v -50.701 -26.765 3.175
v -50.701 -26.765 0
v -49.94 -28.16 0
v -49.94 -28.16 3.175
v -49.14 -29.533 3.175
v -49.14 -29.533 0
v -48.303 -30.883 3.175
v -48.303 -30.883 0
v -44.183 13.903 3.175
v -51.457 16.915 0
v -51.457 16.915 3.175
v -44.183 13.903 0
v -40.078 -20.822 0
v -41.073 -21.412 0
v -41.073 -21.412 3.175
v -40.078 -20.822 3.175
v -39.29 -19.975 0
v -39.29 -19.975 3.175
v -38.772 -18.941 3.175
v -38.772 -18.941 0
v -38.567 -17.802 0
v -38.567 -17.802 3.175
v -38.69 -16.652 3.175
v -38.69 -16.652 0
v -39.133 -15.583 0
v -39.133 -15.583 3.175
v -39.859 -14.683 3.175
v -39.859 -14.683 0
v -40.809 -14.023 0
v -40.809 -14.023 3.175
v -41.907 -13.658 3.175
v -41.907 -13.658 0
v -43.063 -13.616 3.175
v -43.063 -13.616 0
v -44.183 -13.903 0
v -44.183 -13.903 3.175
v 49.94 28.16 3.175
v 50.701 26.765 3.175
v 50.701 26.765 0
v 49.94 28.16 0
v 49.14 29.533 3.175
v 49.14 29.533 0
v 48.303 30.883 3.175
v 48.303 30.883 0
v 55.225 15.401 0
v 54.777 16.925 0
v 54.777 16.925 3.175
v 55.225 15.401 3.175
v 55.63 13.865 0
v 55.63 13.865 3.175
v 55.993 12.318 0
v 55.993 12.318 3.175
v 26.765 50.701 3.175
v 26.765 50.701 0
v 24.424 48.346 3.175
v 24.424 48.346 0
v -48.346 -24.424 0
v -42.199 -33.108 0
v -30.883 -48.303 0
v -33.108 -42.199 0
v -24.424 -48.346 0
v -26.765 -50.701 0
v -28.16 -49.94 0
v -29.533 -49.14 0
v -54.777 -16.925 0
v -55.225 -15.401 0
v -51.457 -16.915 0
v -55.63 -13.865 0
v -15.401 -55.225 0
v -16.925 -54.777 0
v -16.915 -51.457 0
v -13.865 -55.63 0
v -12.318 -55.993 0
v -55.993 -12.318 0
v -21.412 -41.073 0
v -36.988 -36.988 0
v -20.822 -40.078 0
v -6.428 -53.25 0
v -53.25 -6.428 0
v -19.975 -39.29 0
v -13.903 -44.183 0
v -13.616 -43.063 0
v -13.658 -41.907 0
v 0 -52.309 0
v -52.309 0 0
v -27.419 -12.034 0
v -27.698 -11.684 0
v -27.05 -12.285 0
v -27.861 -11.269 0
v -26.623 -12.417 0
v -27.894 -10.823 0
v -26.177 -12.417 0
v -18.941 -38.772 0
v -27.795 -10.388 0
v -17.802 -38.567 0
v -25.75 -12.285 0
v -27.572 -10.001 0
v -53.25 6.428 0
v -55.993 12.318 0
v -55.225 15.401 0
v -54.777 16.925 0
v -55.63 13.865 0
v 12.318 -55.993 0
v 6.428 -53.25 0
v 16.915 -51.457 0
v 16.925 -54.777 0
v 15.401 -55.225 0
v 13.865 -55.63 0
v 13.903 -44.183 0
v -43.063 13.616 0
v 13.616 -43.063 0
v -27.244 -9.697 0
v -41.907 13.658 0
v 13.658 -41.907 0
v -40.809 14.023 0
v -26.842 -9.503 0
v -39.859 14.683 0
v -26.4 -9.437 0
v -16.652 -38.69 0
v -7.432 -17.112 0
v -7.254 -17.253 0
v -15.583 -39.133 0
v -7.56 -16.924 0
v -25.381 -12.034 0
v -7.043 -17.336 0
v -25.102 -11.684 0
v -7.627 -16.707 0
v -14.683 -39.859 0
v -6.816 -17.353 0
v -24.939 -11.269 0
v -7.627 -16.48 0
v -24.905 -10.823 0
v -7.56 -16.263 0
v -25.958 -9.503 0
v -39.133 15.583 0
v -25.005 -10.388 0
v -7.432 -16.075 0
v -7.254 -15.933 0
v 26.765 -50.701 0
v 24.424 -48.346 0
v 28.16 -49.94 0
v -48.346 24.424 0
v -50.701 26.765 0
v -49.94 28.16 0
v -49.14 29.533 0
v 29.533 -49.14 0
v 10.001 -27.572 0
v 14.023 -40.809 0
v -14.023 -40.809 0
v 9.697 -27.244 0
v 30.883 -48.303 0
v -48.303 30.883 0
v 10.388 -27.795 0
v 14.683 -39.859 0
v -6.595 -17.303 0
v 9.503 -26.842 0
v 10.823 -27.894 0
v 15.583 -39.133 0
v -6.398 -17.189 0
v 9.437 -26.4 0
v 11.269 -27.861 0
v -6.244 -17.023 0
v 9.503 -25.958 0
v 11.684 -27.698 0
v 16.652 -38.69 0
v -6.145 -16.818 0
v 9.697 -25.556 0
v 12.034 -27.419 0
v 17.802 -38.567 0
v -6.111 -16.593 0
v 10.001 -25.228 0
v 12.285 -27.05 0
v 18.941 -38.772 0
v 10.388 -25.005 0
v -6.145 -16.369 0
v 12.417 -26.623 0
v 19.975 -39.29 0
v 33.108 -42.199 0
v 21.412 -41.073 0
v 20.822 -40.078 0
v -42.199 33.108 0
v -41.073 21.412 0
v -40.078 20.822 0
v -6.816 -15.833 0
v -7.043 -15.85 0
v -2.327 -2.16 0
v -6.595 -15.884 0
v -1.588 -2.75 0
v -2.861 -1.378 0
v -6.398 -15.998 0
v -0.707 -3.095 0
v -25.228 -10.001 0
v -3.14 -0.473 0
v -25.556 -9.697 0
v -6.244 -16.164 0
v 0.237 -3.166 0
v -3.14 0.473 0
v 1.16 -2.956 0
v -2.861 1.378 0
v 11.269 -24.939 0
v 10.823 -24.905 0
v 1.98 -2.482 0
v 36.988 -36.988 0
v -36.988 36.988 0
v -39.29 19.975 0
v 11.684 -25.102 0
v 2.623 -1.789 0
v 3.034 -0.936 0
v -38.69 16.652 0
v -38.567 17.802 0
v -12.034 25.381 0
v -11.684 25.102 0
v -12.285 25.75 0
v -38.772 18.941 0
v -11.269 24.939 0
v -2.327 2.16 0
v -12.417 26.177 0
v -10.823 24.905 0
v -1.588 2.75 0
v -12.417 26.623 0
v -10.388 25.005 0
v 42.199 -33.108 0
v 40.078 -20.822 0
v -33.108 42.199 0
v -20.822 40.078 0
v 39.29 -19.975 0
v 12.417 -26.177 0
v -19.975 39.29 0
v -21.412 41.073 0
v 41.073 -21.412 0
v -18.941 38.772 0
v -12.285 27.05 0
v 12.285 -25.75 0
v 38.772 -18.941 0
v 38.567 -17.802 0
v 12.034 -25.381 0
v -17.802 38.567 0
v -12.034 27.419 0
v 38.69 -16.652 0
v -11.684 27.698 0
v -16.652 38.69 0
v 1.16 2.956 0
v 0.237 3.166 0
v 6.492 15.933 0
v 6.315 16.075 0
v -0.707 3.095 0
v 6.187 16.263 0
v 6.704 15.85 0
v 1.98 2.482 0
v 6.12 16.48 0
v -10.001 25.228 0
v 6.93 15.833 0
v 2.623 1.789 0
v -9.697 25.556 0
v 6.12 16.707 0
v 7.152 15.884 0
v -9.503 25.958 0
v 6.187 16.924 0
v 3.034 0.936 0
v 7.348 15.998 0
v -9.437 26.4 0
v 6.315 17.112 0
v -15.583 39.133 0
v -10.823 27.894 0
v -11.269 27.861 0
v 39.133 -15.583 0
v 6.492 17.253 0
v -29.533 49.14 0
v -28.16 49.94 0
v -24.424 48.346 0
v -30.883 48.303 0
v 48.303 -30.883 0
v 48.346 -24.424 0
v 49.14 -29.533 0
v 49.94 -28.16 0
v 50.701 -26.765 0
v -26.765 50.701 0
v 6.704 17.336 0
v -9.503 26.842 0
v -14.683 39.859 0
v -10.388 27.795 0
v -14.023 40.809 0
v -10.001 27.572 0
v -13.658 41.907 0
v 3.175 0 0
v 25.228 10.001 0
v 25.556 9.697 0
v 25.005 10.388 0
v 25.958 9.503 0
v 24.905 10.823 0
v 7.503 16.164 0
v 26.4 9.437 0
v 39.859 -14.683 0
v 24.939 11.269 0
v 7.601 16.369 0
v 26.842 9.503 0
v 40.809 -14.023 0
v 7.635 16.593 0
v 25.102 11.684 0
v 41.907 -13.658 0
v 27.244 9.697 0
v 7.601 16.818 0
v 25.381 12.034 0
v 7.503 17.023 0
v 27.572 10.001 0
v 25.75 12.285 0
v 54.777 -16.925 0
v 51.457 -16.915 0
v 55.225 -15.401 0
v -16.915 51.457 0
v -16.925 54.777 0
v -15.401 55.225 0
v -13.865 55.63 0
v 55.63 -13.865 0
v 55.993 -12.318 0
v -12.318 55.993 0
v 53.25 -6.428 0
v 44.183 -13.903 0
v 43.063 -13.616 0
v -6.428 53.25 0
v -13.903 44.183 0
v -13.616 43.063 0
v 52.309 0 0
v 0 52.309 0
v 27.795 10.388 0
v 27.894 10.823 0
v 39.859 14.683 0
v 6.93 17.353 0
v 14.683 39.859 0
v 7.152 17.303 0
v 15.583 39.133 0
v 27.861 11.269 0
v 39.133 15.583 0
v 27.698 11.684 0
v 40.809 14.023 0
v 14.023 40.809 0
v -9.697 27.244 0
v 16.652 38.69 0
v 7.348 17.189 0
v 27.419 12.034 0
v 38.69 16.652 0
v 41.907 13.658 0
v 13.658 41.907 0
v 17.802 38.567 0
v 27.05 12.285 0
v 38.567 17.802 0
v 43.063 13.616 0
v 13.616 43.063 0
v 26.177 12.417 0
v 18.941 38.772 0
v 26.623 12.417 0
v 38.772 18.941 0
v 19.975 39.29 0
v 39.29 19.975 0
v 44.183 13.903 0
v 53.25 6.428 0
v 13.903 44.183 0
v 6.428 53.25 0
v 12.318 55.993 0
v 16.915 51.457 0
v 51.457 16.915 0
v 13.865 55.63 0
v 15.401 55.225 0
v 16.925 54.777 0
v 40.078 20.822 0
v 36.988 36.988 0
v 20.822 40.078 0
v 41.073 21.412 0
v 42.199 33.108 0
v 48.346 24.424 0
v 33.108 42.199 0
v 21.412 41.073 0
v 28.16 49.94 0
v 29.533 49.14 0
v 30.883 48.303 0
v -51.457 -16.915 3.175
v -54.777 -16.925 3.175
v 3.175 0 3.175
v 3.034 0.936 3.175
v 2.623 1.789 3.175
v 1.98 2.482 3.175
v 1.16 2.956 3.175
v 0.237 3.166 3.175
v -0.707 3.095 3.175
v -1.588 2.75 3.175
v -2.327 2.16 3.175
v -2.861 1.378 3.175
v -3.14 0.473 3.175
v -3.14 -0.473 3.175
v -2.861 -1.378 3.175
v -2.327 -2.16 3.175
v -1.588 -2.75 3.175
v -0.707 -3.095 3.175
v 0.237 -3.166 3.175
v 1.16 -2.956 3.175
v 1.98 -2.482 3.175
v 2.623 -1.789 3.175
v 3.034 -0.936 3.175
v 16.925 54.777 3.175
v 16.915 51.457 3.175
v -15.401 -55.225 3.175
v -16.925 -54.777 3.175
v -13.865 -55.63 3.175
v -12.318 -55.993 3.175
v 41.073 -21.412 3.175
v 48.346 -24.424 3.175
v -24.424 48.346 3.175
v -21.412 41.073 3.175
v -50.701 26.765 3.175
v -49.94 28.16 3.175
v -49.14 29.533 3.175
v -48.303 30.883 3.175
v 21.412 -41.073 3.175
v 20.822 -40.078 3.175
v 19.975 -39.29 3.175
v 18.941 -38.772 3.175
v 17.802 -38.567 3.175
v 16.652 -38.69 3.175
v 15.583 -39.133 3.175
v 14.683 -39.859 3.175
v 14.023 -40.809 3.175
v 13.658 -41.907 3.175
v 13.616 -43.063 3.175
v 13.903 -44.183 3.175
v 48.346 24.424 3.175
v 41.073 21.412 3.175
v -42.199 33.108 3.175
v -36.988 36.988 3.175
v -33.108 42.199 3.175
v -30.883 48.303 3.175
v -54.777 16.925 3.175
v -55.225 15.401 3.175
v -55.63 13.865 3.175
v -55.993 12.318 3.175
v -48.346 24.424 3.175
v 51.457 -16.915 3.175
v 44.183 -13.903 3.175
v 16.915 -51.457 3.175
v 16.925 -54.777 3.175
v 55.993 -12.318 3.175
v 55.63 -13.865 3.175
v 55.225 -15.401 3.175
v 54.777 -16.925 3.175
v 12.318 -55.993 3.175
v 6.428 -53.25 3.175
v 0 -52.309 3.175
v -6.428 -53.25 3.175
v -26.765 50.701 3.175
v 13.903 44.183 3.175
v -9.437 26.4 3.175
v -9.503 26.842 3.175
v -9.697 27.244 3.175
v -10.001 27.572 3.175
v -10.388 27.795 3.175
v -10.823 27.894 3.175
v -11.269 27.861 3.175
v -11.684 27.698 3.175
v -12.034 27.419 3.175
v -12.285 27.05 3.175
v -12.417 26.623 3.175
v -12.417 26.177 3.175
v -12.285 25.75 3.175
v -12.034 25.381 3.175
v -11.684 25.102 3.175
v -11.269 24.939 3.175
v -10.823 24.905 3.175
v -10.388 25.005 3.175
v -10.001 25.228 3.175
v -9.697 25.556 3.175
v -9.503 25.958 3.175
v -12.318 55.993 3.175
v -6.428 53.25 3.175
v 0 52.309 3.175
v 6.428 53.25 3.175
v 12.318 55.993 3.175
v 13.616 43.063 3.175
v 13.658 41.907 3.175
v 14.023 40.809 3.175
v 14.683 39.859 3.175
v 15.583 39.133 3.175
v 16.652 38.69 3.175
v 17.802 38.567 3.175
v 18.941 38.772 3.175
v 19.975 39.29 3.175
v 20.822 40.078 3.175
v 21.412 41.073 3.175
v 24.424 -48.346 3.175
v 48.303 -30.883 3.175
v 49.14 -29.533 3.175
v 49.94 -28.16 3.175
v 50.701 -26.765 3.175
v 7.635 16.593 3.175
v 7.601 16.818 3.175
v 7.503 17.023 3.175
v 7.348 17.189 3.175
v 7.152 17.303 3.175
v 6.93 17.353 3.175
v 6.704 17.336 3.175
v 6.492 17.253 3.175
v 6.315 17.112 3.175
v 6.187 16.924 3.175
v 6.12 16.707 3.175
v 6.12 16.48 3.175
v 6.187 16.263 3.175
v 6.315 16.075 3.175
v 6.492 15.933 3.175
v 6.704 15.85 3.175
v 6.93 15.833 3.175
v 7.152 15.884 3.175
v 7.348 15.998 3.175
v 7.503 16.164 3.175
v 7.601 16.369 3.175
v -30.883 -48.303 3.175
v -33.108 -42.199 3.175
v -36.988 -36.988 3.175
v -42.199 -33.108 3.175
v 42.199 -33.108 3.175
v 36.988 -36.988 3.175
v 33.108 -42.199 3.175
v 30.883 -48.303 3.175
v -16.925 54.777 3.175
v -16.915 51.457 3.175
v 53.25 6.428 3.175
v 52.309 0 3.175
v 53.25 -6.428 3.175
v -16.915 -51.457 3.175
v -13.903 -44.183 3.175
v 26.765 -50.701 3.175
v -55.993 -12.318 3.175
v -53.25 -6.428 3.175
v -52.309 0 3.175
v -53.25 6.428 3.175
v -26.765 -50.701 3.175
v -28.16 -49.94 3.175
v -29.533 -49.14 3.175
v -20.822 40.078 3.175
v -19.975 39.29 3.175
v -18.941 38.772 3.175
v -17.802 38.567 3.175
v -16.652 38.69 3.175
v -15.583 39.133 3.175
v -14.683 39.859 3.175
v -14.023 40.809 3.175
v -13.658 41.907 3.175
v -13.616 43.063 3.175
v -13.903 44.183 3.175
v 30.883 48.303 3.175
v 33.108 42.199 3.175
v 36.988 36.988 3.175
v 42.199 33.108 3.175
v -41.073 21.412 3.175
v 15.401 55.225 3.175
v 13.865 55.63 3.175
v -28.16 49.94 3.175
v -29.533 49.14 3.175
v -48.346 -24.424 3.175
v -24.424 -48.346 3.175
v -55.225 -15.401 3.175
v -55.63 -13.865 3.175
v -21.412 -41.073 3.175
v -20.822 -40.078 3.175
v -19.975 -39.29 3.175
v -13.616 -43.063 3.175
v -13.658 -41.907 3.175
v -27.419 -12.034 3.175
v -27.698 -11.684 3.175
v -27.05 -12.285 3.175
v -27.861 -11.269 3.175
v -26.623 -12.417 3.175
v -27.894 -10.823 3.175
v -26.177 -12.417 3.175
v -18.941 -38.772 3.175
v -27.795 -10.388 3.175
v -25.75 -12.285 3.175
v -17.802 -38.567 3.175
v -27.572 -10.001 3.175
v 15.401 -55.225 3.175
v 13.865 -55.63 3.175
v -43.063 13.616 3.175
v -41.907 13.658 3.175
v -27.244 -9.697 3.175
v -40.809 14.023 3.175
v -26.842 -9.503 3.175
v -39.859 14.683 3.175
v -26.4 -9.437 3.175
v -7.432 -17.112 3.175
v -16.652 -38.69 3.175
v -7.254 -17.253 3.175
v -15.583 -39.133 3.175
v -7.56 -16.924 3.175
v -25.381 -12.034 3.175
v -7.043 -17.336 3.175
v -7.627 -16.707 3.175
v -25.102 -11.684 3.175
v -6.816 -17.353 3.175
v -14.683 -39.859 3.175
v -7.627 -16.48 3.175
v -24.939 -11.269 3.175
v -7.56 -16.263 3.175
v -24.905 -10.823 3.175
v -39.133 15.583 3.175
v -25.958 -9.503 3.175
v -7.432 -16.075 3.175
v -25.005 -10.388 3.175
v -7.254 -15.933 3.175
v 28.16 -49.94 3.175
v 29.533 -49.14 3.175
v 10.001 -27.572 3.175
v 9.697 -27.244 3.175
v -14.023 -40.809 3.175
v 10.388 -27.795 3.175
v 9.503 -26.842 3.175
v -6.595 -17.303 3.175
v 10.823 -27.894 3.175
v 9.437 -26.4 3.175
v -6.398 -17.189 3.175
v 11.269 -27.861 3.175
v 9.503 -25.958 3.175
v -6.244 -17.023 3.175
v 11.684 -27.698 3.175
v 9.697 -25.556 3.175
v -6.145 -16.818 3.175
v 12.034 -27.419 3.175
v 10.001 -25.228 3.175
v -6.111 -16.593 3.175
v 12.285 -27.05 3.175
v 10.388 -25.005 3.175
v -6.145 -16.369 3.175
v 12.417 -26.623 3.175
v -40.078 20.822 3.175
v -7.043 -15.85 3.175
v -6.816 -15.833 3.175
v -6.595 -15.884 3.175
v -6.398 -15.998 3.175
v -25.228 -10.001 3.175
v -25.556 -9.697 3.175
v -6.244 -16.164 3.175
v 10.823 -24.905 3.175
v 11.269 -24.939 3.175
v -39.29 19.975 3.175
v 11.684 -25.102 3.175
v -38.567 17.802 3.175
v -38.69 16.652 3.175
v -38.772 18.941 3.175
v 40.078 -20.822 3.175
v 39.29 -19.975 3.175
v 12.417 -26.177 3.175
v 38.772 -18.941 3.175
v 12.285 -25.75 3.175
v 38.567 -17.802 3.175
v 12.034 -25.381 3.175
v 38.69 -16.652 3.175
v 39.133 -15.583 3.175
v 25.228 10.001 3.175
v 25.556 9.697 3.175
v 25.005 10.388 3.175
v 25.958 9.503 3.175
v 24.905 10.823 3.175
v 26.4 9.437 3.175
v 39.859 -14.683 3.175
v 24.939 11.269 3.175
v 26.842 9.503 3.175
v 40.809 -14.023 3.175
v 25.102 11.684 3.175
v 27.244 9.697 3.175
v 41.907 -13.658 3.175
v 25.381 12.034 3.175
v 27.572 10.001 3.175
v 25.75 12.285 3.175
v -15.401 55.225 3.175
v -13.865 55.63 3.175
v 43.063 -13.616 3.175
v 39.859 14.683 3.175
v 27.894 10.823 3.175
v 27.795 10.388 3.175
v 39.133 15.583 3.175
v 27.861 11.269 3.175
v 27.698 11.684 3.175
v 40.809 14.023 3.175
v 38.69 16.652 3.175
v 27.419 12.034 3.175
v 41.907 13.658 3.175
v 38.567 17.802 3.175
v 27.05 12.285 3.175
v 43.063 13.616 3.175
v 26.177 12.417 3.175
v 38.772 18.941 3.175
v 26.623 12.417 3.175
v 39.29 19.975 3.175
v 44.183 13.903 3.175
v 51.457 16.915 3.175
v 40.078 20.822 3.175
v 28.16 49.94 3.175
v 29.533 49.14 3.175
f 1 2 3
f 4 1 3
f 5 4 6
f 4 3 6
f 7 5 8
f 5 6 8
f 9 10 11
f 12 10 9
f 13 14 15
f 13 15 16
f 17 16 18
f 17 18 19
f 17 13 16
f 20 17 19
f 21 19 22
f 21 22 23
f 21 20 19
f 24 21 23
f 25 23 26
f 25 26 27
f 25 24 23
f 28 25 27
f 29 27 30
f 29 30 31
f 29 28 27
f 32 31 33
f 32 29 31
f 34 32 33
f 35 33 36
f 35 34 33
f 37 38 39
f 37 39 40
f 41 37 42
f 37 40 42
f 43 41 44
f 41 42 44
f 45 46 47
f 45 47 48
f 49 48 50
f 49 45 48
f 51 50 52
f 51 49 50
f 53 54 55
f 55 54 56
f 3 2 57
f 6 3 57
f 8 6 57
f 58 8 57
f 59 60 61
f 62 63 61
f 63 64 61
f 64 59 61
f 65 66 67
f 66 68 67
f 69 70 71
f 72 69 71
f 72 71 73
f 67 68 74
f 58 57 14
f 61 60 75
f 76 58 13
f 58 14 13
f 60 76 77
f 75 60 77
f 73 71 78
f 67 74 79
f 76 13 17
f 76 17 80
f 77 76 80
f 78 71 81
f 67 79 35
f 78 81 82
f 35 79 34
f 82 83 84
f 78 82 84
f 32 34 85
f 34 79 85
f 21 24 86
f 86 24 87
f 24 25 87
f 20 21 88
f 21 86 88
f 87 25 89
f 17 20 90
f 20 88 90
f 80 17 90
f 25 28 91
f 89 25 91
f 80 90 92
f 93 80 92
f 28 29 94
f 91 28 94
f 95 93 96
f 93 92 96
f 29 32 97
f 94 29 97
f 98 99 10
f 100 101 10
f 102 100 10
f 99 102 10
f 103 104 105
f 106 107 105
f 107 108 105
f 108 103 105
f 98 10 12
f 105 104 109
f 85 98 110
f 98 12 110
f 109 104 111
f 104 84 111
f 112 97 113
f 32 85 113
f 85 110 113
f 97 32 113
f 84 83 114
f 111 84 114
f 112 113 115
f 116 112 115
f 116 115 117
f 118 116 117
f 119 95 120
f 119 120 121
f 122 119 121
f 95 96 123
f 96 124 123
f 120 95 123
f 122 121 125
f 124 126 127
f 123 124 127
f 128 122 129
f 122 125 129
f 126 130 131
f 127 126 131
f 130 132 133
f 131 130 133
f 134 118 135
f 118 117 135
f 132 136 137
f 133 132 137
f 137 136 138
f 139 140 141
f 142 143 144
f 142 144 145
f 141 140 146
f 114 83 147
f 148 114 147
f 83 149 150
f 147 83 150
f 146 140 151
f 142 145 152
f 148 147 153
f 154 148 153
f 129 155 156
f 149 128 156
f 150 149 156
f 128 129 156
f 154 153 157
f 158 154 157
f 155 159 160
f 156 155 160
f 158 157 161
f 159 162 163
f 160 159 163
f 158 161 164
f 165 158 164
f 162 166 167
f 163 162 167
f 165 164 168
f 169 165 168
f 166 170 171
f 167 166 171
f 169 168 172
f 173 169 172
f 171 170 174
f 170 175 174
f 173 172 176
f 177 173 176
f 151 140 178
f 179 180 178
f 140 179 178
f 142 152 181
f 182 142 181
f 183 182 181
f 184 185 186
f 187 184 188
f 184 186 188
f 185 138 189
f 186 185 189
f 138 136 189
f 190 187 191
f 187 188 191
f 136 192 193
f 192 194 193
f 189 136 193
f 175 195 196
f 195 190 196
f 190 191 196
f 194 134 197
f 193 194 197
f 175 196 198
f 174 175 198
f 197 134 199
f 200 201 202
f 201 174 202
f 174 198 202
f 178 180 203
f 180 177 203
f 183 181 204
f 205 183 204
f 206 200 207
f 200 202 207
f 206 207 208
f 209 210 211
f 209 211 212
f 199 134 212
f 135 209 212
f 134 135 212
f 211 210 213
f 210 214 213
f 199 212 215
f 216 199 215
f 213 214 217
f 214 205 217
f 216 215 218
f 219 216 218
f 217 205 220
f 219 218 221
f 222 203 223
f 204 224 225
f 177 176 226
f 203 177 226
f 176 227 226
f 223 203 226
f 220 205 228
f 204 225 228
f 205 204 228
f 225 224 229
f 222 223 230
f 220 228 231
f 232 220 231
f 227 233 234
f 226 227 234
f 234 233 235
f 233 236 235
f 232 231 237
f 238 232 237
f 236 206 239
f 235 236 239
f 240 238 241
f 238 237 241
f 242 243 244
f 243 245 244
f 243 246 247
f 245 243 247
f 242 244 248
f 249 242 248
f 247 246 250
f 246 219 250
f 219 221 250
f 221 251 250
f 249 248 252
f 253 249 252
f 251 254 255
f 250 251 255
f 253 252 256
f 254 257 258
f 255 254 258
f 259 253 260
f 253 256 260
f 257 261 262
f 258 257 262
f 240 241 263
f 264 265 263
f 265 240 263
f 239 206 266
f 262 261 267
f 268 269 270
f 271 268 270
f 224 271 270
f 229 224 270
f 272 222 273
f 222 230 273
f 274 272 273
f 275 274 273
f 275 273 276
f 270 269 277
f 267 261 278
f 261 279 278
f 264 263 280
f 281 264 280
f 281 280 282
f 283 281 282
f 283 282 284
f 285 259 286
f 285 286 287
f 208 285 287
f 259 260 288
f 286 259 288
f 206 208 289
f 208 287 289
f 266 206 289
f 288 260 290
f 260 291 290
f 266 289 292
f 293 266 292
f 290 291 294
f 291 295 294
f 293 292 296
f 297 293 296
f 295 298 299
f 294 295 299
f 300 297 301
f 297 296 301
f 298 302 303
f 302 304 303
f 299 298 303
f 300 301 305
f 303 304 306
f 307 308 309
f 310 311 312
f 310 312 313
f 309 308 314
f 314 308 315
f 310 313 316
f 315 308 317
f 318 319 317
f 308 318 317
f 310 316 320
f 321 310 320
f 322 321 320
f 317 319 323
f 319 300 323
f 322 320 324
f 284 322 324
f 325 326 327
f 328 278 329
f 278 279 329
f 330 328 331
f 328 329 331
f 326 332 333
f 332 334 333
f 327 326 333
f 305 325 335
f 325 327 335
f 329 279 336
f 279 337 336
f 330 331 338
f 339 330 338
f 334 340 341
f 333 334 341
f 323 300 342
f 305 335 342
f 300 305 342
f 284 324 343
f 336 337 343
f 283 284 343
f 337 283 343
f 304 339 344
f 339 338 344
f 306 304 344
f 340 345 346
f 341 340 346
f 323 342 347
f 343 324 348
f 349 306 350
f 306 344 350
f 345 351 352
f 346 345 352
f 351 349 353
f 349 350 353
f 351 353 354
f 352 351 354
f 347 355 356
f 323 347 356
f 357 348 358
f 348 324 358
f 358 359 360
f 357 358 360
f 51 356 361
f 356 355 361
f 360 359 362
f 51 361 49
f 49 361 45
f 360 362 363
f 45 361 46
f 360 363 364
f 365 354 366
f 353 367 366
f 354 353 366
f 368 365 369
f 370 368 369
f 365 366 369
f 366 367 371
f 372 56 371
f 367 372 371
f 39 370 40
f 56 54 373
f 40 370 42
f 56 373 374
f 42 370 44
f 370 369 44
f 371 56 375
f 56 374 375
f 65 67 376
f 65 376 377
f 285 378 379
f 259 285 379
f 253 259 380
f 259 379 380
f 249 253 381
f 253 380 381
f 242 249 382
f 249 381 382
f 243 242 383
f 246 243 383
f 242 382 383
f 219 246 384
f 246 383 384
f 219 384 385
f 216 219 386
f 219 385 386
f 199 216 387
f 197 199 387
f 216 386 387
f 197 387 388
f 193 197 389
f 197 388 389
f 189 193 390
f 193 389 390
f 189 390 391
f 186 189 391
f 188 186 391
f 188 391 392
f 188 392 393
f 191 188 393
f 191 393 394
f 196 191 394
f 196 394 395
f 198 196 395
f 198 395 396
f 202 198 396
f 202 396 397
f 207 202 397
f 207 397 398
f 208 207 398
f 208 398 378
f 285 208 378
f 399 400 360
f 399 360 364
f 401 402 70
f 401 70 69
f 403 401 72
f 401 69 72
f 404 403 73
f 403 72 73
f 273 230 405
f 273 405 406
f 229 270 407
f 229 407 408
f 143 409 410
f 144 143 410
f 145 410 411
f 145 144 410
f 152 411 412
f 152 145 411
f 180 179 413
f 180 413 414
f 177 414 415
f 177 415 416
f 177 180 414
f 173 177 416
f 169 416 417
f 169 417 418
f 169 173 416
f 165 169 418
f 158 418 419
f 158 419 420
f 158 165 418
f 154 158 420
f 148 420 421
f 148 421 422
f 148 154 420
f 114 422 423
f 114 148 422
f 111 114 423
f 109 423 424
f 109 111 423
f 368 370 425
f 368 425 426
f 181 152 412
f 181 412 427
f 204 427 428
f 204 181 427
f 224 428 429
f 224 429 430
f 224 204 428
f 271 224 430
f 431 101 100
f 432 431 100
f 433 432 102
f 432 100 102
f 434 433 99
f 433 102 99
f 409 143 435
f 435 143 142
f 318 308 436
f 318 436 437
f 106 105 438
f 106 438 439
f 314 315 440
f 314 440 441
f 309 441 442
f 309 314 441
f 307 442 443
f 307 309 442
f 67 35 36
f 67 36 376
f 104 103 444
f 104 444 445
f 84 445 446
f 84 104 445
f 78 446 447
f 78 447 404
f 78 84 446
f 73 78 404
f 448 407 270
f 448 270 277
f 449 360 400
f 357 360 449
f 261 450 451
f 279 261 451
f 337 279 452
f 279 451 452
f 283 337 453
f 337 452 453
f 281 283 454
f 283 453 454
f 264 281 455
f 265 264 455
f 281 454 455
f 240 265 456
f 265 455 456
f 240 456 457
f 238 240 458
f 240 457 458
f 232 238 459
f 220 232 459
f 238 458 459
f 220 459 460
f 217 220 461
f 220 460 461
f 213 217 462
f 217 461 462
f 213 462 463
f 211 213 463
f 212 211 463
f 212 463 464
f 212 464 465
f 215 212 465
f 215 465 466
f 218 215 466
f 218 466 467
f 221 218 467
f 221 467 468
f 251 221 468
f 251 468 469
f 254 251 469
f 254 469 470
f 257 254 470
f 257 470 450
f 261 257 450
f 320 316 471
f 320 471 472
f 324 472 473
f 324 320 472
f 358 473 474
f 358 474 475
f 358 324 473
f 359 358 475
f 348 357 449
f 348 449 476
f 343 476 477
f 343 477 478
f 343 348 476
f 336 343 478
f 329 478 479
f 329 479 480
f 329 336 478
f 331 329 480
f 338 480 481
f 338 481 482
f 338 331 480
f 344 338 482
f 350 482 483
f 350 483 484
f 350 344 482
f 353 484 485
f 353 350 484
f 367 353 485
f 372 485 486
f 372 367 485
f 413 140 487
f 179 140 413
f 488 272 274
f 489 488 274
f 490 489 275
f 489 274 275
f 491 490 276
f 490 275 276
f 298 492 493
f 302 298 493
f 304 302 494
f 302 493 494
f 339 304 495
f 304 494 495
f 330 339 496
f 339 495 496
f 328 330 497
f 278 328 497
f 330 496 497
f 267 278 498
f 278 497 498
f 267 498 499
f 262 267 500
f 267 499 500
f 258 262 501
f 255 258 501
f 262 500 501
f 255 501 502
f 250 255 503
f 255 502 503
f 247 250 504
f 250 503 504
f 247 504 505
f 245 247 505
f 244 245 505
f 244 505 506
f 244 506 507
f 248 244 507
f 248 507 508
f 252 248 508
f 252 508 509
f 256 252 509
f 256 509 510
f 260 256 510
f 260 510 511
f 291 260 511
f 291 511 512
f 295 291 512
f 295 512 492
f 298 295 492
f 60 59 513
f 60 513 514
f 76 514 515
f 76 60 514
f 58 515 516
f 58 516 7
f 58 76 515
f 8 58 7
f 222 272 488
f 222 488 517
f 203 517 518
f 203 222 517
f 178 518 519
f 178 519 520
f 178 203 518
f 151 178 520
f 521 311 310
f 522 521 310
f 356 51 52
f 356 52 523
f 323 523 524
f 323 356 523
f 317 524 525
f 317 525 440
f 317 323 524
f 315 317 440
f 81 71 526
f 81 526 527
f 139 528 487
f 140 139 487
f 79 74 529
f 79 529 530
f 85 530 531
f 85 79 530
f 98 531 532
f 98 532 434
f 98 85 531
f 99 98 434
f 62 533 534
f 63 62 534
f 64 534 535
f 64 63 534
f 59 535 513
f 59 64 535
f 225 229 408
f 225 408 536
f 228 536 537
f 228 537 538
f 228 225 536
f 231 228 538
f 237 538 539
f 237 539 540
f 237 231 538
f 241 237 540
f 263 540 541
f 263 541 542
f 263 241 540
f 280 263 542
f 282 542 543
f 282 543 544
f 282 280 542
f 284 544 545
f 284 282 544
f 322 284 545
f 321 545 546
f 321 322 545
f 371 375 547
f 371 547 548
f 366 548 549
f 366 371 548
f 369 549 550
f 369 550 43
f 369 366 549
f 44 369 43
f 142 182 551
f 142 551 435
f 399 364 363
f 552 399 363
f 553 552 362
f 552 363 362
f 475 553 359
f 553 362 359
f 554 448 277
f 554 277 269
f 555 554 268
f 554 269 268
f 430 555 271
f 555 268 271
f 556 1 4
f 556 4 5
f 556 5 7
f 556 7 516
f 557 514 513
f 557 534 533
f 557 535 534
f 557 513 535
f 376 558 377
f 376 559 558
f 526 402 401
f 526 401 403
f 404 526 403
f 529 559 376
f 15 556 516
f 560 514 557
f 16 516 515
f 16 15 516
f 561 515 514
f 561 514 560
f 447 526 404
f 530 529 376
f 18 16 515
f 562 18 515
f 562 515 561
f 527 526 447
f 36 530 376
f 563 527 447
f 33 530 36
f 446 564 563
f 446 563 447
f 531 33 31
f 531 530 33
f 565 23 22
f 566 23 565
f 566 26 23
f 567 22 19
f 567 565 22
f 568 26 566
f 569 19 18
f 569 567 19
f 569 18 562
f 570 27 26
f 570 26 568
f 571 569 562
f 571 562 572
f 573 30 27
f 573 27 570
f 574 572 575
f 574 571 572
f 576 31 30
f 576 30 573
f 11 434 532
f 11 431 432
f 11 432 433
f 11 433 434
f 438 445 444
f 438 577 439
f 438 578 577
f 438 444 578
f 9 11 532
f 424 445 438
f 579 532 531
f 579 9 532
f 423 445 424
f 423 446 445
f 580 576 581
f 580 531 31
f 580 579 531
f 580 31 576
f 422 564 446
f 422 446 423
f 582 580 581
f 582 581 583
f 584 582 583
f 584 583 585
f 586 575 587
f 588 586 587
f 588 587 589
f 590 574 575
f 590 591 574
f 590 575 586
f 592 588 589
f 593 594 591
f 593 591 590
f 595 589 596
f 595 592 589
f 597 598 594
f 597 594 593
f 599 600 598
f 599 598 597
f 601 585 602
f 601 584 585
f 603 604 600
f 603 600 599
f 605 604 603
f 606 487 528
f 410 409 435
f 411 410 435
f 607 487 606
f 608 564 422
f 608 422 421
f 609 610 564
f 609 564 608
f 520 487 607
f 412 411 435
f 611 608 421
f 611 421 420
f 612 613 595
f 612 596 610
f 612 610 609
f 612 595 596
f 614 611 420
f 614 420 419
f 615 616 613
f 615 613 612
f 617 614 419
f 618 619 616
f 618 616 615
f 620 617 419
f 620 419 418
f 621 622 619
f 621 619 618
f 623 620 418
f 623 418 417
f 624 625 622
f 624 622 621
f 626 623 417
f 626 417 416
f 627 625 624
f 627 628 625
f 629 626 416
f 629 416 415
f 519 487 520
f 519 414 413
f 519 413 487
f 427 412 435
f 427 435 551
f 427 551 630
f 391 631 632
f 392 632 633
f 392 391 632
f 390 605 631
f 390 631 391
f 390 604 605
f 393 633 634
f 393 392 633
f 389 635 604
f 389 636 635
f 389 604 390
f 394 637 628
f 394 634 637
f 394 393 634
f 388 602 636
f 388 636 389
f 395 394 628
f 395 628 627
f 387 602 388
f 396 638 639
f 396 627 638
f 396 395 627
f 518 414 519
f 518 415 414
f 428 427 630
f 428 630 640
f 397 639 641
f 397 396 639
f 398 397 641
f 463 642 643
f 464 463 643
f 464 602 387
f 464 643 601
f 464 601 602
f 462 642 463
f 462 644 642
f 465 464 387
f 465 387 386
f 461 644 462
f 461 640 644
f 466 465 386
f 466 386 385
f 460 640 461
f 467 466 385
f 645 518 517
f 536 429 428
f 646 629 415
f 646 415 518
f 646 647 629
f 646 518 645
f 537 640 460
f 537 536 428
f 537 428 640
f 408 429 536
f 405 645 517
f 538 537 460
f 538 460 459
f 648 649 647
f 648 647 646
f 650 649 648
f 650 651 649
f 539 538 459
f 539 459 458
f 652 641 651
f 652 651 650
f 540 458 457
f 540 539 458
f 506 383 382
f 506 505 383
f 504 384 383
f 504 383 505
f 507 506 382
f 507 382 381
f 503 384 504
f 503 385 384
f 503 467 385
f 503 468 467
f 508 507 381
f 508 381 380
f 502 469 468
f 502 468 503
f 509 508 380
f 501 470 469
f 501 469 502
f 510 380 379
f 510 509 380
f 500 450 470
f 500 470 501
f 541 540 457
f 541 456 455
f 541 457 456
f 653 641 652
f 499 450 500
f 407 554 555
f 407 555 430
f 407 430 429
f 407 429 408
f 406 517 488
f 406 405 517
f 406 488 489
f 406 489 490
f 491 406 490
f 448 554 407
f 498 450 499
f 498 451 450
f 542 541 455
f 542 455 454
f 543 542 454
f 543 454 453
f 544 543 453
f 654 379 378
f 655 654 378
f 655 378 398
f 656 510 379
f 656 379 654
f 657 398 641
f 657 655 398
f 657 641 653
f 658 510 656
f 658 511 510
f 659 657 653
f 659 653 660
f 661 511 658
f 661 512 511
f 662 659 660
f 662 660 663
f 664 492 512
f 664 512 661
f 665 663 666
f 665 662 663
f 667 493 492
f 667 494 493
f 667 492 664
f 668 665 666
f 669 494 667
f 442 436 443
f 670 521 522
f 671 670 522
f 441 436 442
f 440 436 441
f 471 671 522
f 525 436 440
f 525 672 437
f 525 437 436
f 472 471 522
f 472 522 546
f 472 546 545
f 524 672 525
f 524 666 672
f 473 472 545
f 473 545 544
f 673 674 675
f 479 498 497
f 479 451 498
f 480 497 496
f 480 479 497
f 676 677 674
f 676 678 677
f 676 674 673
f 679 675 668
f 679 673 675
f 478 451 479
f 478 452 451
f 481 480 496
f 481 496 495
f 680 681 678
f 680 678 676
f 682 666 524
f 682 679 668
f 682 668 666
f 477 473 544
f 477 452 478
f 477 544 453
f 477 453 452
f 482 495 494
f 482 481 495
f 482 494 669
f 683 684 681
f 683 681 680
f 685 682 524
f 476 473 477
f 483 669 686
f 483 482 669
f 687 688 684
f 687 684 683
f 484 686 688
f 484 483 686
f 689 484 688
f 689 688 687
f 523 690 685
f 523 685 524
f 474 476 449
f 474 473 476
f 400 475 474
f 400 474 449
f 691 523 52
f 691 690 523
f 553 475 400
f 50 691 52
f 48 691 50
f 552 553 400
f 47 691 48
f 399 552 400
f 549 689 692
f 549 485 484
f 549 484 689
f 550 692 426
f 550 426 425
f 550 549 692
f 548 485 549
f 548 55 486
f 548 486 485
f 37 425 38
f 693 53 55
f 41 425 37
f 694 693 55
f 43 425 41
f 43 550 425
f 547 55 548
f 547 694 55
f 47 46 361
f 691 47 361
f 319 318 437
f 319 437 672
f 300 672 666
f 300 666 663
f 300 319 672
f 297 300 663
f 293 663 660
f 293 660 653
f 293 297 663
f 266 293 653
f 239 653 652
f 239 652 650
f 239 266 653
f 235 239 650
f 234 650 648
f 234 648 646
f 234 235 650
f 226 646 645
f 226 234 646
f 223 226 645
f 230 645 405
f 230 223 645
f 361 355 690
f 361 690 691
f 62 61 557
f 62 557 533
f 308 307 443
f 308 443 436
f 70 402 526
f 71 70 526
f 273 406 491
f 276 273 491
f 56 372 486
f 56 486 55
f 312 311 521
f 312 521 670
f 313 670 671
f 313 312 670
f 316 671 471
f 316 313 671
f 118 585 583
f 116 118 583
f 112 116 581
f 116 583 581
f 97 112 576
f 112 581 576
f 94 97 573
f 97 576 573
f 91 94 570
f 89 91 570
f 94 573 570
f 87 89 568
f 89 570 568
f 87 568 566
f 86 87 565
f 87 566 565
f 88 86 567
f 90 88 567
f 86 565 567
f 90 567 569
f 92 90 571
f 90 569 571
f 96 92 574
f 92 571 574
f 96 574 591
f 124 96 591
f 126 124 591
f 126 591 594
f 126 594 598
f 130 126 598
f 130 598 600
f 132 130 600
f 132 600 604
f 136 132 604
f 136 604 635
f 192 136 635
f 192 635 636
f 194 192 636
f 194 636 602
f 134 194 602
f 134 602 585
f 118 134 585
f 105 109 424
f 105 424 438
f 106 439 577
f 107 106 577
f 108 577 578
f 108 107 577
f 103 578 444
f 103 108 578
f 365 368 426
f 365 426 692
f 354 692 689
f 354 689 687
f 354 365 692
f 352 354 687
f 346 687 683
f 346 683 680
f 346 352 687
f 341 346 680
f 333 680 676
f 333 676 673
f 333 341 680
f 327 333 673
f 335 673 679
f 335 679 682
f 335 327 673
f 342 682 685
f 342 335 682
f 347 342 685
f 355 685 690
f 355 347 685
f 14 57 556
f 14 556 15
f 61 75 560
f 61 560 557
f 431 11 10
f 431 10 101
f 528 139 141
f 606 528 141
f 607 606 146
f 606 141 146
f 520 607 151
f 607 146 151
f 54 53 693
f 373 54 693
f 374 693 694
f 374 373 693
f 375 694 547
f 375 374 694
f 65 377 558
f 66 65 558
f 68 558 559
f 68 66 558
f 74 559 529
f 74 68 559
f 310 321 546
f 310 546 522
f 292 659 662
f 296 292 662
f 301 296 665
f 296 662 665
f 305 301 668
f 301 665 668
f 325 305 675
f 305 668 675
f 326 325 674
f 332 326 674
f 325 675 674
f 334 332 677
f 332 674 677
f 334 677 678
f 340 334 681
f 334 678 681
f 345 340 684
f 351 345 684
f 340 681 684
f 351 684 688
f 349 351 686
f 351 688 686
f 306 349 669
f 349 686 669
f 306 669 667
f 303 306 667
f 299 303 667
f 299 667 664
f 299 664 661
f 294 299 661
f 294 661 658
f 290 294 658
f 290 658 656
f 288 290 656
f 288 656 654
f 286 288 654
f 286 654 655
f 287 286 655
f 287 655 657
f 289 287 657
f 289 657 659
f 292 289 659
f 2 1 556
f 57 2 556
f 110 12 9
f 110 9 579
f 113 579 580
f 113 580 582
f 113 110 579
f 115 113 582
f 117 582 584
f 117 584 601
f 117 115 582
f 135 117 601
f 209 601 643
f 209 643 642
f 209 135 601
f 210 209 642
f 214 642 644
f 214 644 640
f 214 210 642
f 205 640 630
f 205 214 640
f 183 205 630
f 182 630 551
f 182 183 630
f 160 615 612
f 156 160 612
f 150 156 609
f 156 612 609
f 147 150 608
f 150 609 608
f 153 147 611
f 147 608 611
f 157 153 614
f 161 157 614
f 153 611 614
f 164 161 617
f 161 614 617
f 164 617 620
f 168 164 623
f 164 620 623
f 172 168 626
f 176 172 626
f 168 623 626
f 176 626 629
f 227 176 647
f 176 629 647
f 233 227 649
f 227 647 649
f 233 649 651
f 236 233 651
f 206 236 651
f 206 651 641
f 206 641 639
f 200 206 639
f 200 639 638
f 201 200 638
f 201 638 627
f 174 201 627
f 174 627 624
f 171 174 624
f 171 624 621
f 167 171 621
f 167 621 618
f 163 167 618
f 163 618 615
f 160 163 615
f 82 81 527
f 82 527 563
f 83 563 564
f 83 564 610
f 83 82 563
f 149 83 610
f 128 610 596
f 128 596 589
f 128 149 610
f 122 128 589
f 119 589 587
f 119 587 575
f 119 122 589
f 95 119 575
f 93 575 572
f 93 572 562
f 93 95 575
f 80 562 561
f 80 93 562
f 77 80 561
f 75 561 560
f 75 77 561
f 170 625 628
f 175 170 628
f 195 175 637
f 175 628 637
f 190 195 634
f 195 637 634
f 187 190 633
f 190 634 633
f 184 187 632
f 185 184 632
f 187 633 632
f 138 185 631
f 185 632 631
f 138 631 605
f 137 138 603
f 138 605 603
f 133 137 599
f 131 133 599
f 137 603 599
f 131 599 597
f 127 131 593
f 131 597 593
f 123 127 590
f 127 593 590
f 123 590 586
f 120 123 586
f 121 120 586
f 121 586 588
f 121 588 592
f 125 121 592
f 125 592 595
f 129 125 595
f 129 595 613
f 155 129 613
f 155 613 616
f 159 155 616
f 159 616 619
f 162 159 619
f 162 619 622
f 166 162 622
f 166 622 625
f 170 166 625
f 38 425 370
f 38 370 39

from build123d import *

# Parameters (mm, degrees)
SKETCH1_R           = 57.332002373
BOSS_EXTRUDE1_DEPTH = 3.175
CUT_EXTRUDE1_START  = -3.175
CUT_EXTRUDE1_DEPTH  = 3.175
CIRPATTERN1_COUNT   = 8
CUT_EXTRUDE2_REACH  = 81.25
SKETCH3_R           = 3.175
CUT_EXTRUDE3_REACH  = 81.25
SKETCH4_R           = 0.762
CHAMFER1_SIZE       = 3.175
CUT_EXTRUDE4_REACH  = 81.25
SKETCH5_R           = 1.4986
CIRPATTERN2_COUNT   = 4


with BuildPart() as part:
    # Sketch1 → Boss-Extrude1 (new body)
    with BuildSketch(Plane.XY):
        Circle(SKETCH1_R)
    extrude(amount=BOSS_EXTRUDE1_DEPTH)

    # Sketch2 → Cut-Extrude1 (cut)
    with BuildSketch(Plane.XY.offset(3.175).offset(CUT_EXTRUDE1_START)):
        with BuildLine():
            Line((62.131865528, 30.134703259), (41.073015989, 21.411842172))
            ThreePointArc((41.073015989, 21.411842172), (38.873595038, 16.101970283), (44.183466927, 13.902549332))
            Line((44.183466927, 13.902549332), (54.389846688, 18.130170251))
            ThreePointArc((54.389846688, 18.130170251), (55.267949497, 15.245073122), (55.99312865, 12.317793637))
            ThreePointArc((55.99312865, 12.317793637), (52.309071806, 0), (55.99312865, -12.317793637))
            ThreePointArc((55.99312865, -12.317793637), (55.267949497, -15.245073122), (54.389846688, -18.130170251))
            Line((54.389846688, -18.130170251), (44.183466927, -13.902549332))
            ThreePointArc((44.183466927, -13.902549332), (38.873595038, -16.101970283), (41.073015989, -21.411842172))
            Line((41.073015989, -21.411842172), (62.131865528, -30.134703259))
            ThreePointArc((62.131865528, -30.134703259), (69.054102373, 0), (62.131865528, 30.134703259))
        make_face()
    cut_extrude1 = extrude(amount=CUT_EXTRUDE1_DEPTH, mode=Mode.SUBTRACT)

    # CirPattern1: Cut-Extrude1 ×8 about axis
    cirpattern1_axis = Axis((0, 0, 0), (0, 0, 1))
    for i in range(1, CIRPATTERN1_COUNT):
        add(cut_extrude1.rotate(cirpattern1_axis, i * 360 / CIRPATTERN1_COUNT), mode=Mode.SUBTRACT)

    # Sketch3 → Cut-Extrude2 (cut, up to next)
    with BuildSketch(Plane.XY.offset(3.175), mode=Mode.PRIVATE) as cut_extrude2_sk1:
        Circle(SKETCH3_R)
    cut_extrude2_tool1 = extrude(cut_extrude2_sk1.sketch, amount=-CUT_EXTRUDE2_REACH, mode=Mode.PRIVATE) & part.part
    add(cut_extrude2_tool1.solids().sort_by_distance((0, 0, 3.175))[0], mode=Mode.SUBTRACT)

    # Sketch4 → Cut-Extrude3 (cut, up to next)
    with BuildSketch(Plane.XY.offset(3.175), mode=Mode.PRIVATE) as cut_extrude3_sk1:
        with Locations((6.873190472, 16.593349654)):
            Circle(SKETCH4_R)
    cut_extrude3_tool1 = extrude(cut_extrude3_sk1.sketch, amount=-CUT_EXTRUDE3_REACH, mode=Mode.PRIVATE) & part.part
    # Sketch4 → Cut-Extrude3 (cut, up to next)
    with BuildSketch(Plane.XY.offset(3.175), mode=Mode.PRIVATE) as cut_extrude3_sk2:
        with Locations((-6.873190472, -16.593349654)):
            Circle(SKETCH4_R)
    cut_extrude3_tool2 = extrude(cut_extrude3_sk2.sketch, amount=-CUT_EXTRUDE3_REACH, mode=Mode.PRIVATE) & part.part
    add(cut_extrude3_tool1.solids().sort_by_distance((6.87319, 16.59335, 3.175))[0], mode=Mode.SUBTRACT)
    add(cut_extrude3_tool2.solids().sort_by_distance((-6.87319, -16.59335, 3.175))[0], mode=Mode.SUBTRACT)

    # Chamfer1
    # the kernel refuses this chamfer: 3.175, 1.27 mm, written as the material it takes off along each edge
    with BuildSketch(Plane(origin=(-51.279395749, 25.639463092, -8.232085276), x_dir=(0.4570542890286377, 0.8894387988392043, 0), z_dir=(0, 0, 1)), Plane(origin=(-18.130170251, 54.389846688, -8.232085276), x_dir=(0.9521143932521638, 0.3057420189670758, 0), z_dir=(0, 0, 1)), Plane(origin=(25.639463092, 51.279395749, -8.232085276), x_dir=(0.8894387988392037, -0.4570542890286388, 0), z_dir=(0, 0, 1)), Plane(origin=(54.389846688, 18.130170251, -8.232085276), x_dir=(0.30574201896707504, -0.9521143932521642, 0), z_dir=(0, 0, 1)), Plane(origin=(25.639463092, -51.279395749, 11.407085276), x_dir=(0.8894387988391999, 0.45705428902864664, 0), z_dir=(0, 0, -1)), Plane(origin=(-18.130170251, -54.389846688, 11.407085276), x_dir=(0.952114393252168, -0.305742018967063, 0), z_dir=(0, 0, -1)), Plane(origin=(-51.279395749, -25.639463092, 11.407085276), x_dir=(0.4570542890286467, -0.8894387988391996, 0), z_dir=(0, 0, -1))) as chamfer1_piece_1:
        with BuildLine():
            Line((1.265469022, 0), (CHAMFER1_SIZE * 0.0818896104616, -CHAMFER1_SIZE * 0.996641405772))
            Line((CHAMFER1_SIZE * 0.0818896104616, -CHAMFER1_SIZE * 0.996641405772), (0, 0))
            ThreePointArc((0, 0), (0.65194513, 0.003488419), (1.265469022, 0))
        make_face()
    extrude(amount=19.639170553, mode=Mode.SUBTRACT)
    with BuildSketch(Plane(origin=(-54.389846688, 18.130170251, 11.407085276), x_dir=(0.9238795325112874, -0.3826834323650885, 0), z_dir=(0, 0, -1)), Plane(origin=(-25.639463092, 51.279395749, 11.407085276), x_dir=(0.3826834323650902, -0.9238795325112866, 0), z_dir=(0, 0, -1)), Plane(origin=(18.130170251, 54.389846688, 11.407085276), x_dir=(-0.3826834323650892, -0.923879532511287, 0), z_dir=(0, 0, -1)), Plane(origin=(51.279395749, 25.639463092, 11.407085276), x_dir=(-0.9238795325112859, -0.38268343236509195, 0), z_dir=(0, 0, -1)), Plane(origin=(18.130170251, -54.389846688, -8.232085276), x_dir=(-0.38268343236509117, 0.9238795325112862, 0), z_dir=(0, 0, 1)), Plane(origin=(-25.639463092, -51.279395749, -8.232085276), x_dir=(0.3826834323650892, 0.923879532511287, 0), z_dir=(0, 0, 1)), Plane(origin=(-54.389846688, -18.130170251, -8.232085276), x_dir=(0.9238795325112866, 0.3826834323650902, 0), z_dir=(0, 0, 1))) as chamfer1_piece_2:
        with BuildLine():
            Line((CHAMFER1_SIZE, 0), (0.103628765, 1.261218825))
            ThreePointArc((0.103628765, 1.261218825), (0.04991083, 0.650041176), (0, 0))
            Line((0, 0), (CHAMFER1_SIZE, 0))
        make_face()
    extrude(amount=19.639170553, mode=Mode.SUBTRACT)
    with BuildSketch(Plane(origin=(51.279395749, -25.639463092, 11.407085276), x_dir=(-0.9238795325112863, 0.382683432365091, 0), z_dir=(0, 0, -1))) as chamfer1_piece_3:
        with BuildLine():
            Line((CHAMFER1_SIZE, 0), (0.103628765, -1.261218825))
            ThreePointArc((0.103628765, -1.261218825), (0.04991083, -0.650041176), (0, 0))
            Line((0, 0), (CHAMFER1_SIZE, 0))
        make_face()
    extrude(amount=19.639170553, mode=Mode.SUBTRACT)
    with BuildSketch(Plane(origin=(54.389846688, -18.130170251, -8.232085276), x_dir=(0.3057420189670742, 0.9521143932521645, 0), z_dir=(0, 0, 1))) as chamfer1_piece_4:
        with BuildLine():
            Line((1.265469022, 0), (CHAMFER1_SIZE * 0.0818896104616, CHAMFER1_SIZE * 0.996641405772))
            Line((CHAMFER1_SIZE * 0.0818896104616, CHAMFER1_SIZE * 0.996641405772), (0, 0))
            ThreePointArc((0, 0), (0.65194513, -0.003488419), (1.265469022, 0))
        make_face()
    extrude(amount=19.639170553, mode=Mode.SUBTRACT)

    # Sketch5 → Cut-Extrude4 (cut, up to next)
    with BuildSketch(Plane.XY.offset(3.175), mode=Mode.PRIVATE) as cut_extrude4_sk1:
        with Locations((-10.93517908, 26.399857642)):
            Circle(SKETCH5_R)
    cut_extrude4_tool1 = extrude(cut_extrude4_sk1.sketch, amount=-CUT_EXTRUDE4_REACH, mode=Mode.PRIVATE) & part.part
    cut_extrude4 = cut_extrude4_tool1.solids().sort_by_distance((-10.935179, 26.399858, 3.175))[0]
    add(cut_extrude4, mode=Mode.SUBTRACT)

    # CirPattern2: Cut-Extrude4 ×4 about axis
    cirpattern2_axis = Axis((0, 0, 0), (0, 0, 1))
    for i in range(1, CIRPATTERN2_COUNT):
        add(cut_extrude4.rotate(cirpattern2_axis, i * 360 / CIRPATTERN2_COUNT), mode=Mode.SUBTRACT)


solid = part.part
